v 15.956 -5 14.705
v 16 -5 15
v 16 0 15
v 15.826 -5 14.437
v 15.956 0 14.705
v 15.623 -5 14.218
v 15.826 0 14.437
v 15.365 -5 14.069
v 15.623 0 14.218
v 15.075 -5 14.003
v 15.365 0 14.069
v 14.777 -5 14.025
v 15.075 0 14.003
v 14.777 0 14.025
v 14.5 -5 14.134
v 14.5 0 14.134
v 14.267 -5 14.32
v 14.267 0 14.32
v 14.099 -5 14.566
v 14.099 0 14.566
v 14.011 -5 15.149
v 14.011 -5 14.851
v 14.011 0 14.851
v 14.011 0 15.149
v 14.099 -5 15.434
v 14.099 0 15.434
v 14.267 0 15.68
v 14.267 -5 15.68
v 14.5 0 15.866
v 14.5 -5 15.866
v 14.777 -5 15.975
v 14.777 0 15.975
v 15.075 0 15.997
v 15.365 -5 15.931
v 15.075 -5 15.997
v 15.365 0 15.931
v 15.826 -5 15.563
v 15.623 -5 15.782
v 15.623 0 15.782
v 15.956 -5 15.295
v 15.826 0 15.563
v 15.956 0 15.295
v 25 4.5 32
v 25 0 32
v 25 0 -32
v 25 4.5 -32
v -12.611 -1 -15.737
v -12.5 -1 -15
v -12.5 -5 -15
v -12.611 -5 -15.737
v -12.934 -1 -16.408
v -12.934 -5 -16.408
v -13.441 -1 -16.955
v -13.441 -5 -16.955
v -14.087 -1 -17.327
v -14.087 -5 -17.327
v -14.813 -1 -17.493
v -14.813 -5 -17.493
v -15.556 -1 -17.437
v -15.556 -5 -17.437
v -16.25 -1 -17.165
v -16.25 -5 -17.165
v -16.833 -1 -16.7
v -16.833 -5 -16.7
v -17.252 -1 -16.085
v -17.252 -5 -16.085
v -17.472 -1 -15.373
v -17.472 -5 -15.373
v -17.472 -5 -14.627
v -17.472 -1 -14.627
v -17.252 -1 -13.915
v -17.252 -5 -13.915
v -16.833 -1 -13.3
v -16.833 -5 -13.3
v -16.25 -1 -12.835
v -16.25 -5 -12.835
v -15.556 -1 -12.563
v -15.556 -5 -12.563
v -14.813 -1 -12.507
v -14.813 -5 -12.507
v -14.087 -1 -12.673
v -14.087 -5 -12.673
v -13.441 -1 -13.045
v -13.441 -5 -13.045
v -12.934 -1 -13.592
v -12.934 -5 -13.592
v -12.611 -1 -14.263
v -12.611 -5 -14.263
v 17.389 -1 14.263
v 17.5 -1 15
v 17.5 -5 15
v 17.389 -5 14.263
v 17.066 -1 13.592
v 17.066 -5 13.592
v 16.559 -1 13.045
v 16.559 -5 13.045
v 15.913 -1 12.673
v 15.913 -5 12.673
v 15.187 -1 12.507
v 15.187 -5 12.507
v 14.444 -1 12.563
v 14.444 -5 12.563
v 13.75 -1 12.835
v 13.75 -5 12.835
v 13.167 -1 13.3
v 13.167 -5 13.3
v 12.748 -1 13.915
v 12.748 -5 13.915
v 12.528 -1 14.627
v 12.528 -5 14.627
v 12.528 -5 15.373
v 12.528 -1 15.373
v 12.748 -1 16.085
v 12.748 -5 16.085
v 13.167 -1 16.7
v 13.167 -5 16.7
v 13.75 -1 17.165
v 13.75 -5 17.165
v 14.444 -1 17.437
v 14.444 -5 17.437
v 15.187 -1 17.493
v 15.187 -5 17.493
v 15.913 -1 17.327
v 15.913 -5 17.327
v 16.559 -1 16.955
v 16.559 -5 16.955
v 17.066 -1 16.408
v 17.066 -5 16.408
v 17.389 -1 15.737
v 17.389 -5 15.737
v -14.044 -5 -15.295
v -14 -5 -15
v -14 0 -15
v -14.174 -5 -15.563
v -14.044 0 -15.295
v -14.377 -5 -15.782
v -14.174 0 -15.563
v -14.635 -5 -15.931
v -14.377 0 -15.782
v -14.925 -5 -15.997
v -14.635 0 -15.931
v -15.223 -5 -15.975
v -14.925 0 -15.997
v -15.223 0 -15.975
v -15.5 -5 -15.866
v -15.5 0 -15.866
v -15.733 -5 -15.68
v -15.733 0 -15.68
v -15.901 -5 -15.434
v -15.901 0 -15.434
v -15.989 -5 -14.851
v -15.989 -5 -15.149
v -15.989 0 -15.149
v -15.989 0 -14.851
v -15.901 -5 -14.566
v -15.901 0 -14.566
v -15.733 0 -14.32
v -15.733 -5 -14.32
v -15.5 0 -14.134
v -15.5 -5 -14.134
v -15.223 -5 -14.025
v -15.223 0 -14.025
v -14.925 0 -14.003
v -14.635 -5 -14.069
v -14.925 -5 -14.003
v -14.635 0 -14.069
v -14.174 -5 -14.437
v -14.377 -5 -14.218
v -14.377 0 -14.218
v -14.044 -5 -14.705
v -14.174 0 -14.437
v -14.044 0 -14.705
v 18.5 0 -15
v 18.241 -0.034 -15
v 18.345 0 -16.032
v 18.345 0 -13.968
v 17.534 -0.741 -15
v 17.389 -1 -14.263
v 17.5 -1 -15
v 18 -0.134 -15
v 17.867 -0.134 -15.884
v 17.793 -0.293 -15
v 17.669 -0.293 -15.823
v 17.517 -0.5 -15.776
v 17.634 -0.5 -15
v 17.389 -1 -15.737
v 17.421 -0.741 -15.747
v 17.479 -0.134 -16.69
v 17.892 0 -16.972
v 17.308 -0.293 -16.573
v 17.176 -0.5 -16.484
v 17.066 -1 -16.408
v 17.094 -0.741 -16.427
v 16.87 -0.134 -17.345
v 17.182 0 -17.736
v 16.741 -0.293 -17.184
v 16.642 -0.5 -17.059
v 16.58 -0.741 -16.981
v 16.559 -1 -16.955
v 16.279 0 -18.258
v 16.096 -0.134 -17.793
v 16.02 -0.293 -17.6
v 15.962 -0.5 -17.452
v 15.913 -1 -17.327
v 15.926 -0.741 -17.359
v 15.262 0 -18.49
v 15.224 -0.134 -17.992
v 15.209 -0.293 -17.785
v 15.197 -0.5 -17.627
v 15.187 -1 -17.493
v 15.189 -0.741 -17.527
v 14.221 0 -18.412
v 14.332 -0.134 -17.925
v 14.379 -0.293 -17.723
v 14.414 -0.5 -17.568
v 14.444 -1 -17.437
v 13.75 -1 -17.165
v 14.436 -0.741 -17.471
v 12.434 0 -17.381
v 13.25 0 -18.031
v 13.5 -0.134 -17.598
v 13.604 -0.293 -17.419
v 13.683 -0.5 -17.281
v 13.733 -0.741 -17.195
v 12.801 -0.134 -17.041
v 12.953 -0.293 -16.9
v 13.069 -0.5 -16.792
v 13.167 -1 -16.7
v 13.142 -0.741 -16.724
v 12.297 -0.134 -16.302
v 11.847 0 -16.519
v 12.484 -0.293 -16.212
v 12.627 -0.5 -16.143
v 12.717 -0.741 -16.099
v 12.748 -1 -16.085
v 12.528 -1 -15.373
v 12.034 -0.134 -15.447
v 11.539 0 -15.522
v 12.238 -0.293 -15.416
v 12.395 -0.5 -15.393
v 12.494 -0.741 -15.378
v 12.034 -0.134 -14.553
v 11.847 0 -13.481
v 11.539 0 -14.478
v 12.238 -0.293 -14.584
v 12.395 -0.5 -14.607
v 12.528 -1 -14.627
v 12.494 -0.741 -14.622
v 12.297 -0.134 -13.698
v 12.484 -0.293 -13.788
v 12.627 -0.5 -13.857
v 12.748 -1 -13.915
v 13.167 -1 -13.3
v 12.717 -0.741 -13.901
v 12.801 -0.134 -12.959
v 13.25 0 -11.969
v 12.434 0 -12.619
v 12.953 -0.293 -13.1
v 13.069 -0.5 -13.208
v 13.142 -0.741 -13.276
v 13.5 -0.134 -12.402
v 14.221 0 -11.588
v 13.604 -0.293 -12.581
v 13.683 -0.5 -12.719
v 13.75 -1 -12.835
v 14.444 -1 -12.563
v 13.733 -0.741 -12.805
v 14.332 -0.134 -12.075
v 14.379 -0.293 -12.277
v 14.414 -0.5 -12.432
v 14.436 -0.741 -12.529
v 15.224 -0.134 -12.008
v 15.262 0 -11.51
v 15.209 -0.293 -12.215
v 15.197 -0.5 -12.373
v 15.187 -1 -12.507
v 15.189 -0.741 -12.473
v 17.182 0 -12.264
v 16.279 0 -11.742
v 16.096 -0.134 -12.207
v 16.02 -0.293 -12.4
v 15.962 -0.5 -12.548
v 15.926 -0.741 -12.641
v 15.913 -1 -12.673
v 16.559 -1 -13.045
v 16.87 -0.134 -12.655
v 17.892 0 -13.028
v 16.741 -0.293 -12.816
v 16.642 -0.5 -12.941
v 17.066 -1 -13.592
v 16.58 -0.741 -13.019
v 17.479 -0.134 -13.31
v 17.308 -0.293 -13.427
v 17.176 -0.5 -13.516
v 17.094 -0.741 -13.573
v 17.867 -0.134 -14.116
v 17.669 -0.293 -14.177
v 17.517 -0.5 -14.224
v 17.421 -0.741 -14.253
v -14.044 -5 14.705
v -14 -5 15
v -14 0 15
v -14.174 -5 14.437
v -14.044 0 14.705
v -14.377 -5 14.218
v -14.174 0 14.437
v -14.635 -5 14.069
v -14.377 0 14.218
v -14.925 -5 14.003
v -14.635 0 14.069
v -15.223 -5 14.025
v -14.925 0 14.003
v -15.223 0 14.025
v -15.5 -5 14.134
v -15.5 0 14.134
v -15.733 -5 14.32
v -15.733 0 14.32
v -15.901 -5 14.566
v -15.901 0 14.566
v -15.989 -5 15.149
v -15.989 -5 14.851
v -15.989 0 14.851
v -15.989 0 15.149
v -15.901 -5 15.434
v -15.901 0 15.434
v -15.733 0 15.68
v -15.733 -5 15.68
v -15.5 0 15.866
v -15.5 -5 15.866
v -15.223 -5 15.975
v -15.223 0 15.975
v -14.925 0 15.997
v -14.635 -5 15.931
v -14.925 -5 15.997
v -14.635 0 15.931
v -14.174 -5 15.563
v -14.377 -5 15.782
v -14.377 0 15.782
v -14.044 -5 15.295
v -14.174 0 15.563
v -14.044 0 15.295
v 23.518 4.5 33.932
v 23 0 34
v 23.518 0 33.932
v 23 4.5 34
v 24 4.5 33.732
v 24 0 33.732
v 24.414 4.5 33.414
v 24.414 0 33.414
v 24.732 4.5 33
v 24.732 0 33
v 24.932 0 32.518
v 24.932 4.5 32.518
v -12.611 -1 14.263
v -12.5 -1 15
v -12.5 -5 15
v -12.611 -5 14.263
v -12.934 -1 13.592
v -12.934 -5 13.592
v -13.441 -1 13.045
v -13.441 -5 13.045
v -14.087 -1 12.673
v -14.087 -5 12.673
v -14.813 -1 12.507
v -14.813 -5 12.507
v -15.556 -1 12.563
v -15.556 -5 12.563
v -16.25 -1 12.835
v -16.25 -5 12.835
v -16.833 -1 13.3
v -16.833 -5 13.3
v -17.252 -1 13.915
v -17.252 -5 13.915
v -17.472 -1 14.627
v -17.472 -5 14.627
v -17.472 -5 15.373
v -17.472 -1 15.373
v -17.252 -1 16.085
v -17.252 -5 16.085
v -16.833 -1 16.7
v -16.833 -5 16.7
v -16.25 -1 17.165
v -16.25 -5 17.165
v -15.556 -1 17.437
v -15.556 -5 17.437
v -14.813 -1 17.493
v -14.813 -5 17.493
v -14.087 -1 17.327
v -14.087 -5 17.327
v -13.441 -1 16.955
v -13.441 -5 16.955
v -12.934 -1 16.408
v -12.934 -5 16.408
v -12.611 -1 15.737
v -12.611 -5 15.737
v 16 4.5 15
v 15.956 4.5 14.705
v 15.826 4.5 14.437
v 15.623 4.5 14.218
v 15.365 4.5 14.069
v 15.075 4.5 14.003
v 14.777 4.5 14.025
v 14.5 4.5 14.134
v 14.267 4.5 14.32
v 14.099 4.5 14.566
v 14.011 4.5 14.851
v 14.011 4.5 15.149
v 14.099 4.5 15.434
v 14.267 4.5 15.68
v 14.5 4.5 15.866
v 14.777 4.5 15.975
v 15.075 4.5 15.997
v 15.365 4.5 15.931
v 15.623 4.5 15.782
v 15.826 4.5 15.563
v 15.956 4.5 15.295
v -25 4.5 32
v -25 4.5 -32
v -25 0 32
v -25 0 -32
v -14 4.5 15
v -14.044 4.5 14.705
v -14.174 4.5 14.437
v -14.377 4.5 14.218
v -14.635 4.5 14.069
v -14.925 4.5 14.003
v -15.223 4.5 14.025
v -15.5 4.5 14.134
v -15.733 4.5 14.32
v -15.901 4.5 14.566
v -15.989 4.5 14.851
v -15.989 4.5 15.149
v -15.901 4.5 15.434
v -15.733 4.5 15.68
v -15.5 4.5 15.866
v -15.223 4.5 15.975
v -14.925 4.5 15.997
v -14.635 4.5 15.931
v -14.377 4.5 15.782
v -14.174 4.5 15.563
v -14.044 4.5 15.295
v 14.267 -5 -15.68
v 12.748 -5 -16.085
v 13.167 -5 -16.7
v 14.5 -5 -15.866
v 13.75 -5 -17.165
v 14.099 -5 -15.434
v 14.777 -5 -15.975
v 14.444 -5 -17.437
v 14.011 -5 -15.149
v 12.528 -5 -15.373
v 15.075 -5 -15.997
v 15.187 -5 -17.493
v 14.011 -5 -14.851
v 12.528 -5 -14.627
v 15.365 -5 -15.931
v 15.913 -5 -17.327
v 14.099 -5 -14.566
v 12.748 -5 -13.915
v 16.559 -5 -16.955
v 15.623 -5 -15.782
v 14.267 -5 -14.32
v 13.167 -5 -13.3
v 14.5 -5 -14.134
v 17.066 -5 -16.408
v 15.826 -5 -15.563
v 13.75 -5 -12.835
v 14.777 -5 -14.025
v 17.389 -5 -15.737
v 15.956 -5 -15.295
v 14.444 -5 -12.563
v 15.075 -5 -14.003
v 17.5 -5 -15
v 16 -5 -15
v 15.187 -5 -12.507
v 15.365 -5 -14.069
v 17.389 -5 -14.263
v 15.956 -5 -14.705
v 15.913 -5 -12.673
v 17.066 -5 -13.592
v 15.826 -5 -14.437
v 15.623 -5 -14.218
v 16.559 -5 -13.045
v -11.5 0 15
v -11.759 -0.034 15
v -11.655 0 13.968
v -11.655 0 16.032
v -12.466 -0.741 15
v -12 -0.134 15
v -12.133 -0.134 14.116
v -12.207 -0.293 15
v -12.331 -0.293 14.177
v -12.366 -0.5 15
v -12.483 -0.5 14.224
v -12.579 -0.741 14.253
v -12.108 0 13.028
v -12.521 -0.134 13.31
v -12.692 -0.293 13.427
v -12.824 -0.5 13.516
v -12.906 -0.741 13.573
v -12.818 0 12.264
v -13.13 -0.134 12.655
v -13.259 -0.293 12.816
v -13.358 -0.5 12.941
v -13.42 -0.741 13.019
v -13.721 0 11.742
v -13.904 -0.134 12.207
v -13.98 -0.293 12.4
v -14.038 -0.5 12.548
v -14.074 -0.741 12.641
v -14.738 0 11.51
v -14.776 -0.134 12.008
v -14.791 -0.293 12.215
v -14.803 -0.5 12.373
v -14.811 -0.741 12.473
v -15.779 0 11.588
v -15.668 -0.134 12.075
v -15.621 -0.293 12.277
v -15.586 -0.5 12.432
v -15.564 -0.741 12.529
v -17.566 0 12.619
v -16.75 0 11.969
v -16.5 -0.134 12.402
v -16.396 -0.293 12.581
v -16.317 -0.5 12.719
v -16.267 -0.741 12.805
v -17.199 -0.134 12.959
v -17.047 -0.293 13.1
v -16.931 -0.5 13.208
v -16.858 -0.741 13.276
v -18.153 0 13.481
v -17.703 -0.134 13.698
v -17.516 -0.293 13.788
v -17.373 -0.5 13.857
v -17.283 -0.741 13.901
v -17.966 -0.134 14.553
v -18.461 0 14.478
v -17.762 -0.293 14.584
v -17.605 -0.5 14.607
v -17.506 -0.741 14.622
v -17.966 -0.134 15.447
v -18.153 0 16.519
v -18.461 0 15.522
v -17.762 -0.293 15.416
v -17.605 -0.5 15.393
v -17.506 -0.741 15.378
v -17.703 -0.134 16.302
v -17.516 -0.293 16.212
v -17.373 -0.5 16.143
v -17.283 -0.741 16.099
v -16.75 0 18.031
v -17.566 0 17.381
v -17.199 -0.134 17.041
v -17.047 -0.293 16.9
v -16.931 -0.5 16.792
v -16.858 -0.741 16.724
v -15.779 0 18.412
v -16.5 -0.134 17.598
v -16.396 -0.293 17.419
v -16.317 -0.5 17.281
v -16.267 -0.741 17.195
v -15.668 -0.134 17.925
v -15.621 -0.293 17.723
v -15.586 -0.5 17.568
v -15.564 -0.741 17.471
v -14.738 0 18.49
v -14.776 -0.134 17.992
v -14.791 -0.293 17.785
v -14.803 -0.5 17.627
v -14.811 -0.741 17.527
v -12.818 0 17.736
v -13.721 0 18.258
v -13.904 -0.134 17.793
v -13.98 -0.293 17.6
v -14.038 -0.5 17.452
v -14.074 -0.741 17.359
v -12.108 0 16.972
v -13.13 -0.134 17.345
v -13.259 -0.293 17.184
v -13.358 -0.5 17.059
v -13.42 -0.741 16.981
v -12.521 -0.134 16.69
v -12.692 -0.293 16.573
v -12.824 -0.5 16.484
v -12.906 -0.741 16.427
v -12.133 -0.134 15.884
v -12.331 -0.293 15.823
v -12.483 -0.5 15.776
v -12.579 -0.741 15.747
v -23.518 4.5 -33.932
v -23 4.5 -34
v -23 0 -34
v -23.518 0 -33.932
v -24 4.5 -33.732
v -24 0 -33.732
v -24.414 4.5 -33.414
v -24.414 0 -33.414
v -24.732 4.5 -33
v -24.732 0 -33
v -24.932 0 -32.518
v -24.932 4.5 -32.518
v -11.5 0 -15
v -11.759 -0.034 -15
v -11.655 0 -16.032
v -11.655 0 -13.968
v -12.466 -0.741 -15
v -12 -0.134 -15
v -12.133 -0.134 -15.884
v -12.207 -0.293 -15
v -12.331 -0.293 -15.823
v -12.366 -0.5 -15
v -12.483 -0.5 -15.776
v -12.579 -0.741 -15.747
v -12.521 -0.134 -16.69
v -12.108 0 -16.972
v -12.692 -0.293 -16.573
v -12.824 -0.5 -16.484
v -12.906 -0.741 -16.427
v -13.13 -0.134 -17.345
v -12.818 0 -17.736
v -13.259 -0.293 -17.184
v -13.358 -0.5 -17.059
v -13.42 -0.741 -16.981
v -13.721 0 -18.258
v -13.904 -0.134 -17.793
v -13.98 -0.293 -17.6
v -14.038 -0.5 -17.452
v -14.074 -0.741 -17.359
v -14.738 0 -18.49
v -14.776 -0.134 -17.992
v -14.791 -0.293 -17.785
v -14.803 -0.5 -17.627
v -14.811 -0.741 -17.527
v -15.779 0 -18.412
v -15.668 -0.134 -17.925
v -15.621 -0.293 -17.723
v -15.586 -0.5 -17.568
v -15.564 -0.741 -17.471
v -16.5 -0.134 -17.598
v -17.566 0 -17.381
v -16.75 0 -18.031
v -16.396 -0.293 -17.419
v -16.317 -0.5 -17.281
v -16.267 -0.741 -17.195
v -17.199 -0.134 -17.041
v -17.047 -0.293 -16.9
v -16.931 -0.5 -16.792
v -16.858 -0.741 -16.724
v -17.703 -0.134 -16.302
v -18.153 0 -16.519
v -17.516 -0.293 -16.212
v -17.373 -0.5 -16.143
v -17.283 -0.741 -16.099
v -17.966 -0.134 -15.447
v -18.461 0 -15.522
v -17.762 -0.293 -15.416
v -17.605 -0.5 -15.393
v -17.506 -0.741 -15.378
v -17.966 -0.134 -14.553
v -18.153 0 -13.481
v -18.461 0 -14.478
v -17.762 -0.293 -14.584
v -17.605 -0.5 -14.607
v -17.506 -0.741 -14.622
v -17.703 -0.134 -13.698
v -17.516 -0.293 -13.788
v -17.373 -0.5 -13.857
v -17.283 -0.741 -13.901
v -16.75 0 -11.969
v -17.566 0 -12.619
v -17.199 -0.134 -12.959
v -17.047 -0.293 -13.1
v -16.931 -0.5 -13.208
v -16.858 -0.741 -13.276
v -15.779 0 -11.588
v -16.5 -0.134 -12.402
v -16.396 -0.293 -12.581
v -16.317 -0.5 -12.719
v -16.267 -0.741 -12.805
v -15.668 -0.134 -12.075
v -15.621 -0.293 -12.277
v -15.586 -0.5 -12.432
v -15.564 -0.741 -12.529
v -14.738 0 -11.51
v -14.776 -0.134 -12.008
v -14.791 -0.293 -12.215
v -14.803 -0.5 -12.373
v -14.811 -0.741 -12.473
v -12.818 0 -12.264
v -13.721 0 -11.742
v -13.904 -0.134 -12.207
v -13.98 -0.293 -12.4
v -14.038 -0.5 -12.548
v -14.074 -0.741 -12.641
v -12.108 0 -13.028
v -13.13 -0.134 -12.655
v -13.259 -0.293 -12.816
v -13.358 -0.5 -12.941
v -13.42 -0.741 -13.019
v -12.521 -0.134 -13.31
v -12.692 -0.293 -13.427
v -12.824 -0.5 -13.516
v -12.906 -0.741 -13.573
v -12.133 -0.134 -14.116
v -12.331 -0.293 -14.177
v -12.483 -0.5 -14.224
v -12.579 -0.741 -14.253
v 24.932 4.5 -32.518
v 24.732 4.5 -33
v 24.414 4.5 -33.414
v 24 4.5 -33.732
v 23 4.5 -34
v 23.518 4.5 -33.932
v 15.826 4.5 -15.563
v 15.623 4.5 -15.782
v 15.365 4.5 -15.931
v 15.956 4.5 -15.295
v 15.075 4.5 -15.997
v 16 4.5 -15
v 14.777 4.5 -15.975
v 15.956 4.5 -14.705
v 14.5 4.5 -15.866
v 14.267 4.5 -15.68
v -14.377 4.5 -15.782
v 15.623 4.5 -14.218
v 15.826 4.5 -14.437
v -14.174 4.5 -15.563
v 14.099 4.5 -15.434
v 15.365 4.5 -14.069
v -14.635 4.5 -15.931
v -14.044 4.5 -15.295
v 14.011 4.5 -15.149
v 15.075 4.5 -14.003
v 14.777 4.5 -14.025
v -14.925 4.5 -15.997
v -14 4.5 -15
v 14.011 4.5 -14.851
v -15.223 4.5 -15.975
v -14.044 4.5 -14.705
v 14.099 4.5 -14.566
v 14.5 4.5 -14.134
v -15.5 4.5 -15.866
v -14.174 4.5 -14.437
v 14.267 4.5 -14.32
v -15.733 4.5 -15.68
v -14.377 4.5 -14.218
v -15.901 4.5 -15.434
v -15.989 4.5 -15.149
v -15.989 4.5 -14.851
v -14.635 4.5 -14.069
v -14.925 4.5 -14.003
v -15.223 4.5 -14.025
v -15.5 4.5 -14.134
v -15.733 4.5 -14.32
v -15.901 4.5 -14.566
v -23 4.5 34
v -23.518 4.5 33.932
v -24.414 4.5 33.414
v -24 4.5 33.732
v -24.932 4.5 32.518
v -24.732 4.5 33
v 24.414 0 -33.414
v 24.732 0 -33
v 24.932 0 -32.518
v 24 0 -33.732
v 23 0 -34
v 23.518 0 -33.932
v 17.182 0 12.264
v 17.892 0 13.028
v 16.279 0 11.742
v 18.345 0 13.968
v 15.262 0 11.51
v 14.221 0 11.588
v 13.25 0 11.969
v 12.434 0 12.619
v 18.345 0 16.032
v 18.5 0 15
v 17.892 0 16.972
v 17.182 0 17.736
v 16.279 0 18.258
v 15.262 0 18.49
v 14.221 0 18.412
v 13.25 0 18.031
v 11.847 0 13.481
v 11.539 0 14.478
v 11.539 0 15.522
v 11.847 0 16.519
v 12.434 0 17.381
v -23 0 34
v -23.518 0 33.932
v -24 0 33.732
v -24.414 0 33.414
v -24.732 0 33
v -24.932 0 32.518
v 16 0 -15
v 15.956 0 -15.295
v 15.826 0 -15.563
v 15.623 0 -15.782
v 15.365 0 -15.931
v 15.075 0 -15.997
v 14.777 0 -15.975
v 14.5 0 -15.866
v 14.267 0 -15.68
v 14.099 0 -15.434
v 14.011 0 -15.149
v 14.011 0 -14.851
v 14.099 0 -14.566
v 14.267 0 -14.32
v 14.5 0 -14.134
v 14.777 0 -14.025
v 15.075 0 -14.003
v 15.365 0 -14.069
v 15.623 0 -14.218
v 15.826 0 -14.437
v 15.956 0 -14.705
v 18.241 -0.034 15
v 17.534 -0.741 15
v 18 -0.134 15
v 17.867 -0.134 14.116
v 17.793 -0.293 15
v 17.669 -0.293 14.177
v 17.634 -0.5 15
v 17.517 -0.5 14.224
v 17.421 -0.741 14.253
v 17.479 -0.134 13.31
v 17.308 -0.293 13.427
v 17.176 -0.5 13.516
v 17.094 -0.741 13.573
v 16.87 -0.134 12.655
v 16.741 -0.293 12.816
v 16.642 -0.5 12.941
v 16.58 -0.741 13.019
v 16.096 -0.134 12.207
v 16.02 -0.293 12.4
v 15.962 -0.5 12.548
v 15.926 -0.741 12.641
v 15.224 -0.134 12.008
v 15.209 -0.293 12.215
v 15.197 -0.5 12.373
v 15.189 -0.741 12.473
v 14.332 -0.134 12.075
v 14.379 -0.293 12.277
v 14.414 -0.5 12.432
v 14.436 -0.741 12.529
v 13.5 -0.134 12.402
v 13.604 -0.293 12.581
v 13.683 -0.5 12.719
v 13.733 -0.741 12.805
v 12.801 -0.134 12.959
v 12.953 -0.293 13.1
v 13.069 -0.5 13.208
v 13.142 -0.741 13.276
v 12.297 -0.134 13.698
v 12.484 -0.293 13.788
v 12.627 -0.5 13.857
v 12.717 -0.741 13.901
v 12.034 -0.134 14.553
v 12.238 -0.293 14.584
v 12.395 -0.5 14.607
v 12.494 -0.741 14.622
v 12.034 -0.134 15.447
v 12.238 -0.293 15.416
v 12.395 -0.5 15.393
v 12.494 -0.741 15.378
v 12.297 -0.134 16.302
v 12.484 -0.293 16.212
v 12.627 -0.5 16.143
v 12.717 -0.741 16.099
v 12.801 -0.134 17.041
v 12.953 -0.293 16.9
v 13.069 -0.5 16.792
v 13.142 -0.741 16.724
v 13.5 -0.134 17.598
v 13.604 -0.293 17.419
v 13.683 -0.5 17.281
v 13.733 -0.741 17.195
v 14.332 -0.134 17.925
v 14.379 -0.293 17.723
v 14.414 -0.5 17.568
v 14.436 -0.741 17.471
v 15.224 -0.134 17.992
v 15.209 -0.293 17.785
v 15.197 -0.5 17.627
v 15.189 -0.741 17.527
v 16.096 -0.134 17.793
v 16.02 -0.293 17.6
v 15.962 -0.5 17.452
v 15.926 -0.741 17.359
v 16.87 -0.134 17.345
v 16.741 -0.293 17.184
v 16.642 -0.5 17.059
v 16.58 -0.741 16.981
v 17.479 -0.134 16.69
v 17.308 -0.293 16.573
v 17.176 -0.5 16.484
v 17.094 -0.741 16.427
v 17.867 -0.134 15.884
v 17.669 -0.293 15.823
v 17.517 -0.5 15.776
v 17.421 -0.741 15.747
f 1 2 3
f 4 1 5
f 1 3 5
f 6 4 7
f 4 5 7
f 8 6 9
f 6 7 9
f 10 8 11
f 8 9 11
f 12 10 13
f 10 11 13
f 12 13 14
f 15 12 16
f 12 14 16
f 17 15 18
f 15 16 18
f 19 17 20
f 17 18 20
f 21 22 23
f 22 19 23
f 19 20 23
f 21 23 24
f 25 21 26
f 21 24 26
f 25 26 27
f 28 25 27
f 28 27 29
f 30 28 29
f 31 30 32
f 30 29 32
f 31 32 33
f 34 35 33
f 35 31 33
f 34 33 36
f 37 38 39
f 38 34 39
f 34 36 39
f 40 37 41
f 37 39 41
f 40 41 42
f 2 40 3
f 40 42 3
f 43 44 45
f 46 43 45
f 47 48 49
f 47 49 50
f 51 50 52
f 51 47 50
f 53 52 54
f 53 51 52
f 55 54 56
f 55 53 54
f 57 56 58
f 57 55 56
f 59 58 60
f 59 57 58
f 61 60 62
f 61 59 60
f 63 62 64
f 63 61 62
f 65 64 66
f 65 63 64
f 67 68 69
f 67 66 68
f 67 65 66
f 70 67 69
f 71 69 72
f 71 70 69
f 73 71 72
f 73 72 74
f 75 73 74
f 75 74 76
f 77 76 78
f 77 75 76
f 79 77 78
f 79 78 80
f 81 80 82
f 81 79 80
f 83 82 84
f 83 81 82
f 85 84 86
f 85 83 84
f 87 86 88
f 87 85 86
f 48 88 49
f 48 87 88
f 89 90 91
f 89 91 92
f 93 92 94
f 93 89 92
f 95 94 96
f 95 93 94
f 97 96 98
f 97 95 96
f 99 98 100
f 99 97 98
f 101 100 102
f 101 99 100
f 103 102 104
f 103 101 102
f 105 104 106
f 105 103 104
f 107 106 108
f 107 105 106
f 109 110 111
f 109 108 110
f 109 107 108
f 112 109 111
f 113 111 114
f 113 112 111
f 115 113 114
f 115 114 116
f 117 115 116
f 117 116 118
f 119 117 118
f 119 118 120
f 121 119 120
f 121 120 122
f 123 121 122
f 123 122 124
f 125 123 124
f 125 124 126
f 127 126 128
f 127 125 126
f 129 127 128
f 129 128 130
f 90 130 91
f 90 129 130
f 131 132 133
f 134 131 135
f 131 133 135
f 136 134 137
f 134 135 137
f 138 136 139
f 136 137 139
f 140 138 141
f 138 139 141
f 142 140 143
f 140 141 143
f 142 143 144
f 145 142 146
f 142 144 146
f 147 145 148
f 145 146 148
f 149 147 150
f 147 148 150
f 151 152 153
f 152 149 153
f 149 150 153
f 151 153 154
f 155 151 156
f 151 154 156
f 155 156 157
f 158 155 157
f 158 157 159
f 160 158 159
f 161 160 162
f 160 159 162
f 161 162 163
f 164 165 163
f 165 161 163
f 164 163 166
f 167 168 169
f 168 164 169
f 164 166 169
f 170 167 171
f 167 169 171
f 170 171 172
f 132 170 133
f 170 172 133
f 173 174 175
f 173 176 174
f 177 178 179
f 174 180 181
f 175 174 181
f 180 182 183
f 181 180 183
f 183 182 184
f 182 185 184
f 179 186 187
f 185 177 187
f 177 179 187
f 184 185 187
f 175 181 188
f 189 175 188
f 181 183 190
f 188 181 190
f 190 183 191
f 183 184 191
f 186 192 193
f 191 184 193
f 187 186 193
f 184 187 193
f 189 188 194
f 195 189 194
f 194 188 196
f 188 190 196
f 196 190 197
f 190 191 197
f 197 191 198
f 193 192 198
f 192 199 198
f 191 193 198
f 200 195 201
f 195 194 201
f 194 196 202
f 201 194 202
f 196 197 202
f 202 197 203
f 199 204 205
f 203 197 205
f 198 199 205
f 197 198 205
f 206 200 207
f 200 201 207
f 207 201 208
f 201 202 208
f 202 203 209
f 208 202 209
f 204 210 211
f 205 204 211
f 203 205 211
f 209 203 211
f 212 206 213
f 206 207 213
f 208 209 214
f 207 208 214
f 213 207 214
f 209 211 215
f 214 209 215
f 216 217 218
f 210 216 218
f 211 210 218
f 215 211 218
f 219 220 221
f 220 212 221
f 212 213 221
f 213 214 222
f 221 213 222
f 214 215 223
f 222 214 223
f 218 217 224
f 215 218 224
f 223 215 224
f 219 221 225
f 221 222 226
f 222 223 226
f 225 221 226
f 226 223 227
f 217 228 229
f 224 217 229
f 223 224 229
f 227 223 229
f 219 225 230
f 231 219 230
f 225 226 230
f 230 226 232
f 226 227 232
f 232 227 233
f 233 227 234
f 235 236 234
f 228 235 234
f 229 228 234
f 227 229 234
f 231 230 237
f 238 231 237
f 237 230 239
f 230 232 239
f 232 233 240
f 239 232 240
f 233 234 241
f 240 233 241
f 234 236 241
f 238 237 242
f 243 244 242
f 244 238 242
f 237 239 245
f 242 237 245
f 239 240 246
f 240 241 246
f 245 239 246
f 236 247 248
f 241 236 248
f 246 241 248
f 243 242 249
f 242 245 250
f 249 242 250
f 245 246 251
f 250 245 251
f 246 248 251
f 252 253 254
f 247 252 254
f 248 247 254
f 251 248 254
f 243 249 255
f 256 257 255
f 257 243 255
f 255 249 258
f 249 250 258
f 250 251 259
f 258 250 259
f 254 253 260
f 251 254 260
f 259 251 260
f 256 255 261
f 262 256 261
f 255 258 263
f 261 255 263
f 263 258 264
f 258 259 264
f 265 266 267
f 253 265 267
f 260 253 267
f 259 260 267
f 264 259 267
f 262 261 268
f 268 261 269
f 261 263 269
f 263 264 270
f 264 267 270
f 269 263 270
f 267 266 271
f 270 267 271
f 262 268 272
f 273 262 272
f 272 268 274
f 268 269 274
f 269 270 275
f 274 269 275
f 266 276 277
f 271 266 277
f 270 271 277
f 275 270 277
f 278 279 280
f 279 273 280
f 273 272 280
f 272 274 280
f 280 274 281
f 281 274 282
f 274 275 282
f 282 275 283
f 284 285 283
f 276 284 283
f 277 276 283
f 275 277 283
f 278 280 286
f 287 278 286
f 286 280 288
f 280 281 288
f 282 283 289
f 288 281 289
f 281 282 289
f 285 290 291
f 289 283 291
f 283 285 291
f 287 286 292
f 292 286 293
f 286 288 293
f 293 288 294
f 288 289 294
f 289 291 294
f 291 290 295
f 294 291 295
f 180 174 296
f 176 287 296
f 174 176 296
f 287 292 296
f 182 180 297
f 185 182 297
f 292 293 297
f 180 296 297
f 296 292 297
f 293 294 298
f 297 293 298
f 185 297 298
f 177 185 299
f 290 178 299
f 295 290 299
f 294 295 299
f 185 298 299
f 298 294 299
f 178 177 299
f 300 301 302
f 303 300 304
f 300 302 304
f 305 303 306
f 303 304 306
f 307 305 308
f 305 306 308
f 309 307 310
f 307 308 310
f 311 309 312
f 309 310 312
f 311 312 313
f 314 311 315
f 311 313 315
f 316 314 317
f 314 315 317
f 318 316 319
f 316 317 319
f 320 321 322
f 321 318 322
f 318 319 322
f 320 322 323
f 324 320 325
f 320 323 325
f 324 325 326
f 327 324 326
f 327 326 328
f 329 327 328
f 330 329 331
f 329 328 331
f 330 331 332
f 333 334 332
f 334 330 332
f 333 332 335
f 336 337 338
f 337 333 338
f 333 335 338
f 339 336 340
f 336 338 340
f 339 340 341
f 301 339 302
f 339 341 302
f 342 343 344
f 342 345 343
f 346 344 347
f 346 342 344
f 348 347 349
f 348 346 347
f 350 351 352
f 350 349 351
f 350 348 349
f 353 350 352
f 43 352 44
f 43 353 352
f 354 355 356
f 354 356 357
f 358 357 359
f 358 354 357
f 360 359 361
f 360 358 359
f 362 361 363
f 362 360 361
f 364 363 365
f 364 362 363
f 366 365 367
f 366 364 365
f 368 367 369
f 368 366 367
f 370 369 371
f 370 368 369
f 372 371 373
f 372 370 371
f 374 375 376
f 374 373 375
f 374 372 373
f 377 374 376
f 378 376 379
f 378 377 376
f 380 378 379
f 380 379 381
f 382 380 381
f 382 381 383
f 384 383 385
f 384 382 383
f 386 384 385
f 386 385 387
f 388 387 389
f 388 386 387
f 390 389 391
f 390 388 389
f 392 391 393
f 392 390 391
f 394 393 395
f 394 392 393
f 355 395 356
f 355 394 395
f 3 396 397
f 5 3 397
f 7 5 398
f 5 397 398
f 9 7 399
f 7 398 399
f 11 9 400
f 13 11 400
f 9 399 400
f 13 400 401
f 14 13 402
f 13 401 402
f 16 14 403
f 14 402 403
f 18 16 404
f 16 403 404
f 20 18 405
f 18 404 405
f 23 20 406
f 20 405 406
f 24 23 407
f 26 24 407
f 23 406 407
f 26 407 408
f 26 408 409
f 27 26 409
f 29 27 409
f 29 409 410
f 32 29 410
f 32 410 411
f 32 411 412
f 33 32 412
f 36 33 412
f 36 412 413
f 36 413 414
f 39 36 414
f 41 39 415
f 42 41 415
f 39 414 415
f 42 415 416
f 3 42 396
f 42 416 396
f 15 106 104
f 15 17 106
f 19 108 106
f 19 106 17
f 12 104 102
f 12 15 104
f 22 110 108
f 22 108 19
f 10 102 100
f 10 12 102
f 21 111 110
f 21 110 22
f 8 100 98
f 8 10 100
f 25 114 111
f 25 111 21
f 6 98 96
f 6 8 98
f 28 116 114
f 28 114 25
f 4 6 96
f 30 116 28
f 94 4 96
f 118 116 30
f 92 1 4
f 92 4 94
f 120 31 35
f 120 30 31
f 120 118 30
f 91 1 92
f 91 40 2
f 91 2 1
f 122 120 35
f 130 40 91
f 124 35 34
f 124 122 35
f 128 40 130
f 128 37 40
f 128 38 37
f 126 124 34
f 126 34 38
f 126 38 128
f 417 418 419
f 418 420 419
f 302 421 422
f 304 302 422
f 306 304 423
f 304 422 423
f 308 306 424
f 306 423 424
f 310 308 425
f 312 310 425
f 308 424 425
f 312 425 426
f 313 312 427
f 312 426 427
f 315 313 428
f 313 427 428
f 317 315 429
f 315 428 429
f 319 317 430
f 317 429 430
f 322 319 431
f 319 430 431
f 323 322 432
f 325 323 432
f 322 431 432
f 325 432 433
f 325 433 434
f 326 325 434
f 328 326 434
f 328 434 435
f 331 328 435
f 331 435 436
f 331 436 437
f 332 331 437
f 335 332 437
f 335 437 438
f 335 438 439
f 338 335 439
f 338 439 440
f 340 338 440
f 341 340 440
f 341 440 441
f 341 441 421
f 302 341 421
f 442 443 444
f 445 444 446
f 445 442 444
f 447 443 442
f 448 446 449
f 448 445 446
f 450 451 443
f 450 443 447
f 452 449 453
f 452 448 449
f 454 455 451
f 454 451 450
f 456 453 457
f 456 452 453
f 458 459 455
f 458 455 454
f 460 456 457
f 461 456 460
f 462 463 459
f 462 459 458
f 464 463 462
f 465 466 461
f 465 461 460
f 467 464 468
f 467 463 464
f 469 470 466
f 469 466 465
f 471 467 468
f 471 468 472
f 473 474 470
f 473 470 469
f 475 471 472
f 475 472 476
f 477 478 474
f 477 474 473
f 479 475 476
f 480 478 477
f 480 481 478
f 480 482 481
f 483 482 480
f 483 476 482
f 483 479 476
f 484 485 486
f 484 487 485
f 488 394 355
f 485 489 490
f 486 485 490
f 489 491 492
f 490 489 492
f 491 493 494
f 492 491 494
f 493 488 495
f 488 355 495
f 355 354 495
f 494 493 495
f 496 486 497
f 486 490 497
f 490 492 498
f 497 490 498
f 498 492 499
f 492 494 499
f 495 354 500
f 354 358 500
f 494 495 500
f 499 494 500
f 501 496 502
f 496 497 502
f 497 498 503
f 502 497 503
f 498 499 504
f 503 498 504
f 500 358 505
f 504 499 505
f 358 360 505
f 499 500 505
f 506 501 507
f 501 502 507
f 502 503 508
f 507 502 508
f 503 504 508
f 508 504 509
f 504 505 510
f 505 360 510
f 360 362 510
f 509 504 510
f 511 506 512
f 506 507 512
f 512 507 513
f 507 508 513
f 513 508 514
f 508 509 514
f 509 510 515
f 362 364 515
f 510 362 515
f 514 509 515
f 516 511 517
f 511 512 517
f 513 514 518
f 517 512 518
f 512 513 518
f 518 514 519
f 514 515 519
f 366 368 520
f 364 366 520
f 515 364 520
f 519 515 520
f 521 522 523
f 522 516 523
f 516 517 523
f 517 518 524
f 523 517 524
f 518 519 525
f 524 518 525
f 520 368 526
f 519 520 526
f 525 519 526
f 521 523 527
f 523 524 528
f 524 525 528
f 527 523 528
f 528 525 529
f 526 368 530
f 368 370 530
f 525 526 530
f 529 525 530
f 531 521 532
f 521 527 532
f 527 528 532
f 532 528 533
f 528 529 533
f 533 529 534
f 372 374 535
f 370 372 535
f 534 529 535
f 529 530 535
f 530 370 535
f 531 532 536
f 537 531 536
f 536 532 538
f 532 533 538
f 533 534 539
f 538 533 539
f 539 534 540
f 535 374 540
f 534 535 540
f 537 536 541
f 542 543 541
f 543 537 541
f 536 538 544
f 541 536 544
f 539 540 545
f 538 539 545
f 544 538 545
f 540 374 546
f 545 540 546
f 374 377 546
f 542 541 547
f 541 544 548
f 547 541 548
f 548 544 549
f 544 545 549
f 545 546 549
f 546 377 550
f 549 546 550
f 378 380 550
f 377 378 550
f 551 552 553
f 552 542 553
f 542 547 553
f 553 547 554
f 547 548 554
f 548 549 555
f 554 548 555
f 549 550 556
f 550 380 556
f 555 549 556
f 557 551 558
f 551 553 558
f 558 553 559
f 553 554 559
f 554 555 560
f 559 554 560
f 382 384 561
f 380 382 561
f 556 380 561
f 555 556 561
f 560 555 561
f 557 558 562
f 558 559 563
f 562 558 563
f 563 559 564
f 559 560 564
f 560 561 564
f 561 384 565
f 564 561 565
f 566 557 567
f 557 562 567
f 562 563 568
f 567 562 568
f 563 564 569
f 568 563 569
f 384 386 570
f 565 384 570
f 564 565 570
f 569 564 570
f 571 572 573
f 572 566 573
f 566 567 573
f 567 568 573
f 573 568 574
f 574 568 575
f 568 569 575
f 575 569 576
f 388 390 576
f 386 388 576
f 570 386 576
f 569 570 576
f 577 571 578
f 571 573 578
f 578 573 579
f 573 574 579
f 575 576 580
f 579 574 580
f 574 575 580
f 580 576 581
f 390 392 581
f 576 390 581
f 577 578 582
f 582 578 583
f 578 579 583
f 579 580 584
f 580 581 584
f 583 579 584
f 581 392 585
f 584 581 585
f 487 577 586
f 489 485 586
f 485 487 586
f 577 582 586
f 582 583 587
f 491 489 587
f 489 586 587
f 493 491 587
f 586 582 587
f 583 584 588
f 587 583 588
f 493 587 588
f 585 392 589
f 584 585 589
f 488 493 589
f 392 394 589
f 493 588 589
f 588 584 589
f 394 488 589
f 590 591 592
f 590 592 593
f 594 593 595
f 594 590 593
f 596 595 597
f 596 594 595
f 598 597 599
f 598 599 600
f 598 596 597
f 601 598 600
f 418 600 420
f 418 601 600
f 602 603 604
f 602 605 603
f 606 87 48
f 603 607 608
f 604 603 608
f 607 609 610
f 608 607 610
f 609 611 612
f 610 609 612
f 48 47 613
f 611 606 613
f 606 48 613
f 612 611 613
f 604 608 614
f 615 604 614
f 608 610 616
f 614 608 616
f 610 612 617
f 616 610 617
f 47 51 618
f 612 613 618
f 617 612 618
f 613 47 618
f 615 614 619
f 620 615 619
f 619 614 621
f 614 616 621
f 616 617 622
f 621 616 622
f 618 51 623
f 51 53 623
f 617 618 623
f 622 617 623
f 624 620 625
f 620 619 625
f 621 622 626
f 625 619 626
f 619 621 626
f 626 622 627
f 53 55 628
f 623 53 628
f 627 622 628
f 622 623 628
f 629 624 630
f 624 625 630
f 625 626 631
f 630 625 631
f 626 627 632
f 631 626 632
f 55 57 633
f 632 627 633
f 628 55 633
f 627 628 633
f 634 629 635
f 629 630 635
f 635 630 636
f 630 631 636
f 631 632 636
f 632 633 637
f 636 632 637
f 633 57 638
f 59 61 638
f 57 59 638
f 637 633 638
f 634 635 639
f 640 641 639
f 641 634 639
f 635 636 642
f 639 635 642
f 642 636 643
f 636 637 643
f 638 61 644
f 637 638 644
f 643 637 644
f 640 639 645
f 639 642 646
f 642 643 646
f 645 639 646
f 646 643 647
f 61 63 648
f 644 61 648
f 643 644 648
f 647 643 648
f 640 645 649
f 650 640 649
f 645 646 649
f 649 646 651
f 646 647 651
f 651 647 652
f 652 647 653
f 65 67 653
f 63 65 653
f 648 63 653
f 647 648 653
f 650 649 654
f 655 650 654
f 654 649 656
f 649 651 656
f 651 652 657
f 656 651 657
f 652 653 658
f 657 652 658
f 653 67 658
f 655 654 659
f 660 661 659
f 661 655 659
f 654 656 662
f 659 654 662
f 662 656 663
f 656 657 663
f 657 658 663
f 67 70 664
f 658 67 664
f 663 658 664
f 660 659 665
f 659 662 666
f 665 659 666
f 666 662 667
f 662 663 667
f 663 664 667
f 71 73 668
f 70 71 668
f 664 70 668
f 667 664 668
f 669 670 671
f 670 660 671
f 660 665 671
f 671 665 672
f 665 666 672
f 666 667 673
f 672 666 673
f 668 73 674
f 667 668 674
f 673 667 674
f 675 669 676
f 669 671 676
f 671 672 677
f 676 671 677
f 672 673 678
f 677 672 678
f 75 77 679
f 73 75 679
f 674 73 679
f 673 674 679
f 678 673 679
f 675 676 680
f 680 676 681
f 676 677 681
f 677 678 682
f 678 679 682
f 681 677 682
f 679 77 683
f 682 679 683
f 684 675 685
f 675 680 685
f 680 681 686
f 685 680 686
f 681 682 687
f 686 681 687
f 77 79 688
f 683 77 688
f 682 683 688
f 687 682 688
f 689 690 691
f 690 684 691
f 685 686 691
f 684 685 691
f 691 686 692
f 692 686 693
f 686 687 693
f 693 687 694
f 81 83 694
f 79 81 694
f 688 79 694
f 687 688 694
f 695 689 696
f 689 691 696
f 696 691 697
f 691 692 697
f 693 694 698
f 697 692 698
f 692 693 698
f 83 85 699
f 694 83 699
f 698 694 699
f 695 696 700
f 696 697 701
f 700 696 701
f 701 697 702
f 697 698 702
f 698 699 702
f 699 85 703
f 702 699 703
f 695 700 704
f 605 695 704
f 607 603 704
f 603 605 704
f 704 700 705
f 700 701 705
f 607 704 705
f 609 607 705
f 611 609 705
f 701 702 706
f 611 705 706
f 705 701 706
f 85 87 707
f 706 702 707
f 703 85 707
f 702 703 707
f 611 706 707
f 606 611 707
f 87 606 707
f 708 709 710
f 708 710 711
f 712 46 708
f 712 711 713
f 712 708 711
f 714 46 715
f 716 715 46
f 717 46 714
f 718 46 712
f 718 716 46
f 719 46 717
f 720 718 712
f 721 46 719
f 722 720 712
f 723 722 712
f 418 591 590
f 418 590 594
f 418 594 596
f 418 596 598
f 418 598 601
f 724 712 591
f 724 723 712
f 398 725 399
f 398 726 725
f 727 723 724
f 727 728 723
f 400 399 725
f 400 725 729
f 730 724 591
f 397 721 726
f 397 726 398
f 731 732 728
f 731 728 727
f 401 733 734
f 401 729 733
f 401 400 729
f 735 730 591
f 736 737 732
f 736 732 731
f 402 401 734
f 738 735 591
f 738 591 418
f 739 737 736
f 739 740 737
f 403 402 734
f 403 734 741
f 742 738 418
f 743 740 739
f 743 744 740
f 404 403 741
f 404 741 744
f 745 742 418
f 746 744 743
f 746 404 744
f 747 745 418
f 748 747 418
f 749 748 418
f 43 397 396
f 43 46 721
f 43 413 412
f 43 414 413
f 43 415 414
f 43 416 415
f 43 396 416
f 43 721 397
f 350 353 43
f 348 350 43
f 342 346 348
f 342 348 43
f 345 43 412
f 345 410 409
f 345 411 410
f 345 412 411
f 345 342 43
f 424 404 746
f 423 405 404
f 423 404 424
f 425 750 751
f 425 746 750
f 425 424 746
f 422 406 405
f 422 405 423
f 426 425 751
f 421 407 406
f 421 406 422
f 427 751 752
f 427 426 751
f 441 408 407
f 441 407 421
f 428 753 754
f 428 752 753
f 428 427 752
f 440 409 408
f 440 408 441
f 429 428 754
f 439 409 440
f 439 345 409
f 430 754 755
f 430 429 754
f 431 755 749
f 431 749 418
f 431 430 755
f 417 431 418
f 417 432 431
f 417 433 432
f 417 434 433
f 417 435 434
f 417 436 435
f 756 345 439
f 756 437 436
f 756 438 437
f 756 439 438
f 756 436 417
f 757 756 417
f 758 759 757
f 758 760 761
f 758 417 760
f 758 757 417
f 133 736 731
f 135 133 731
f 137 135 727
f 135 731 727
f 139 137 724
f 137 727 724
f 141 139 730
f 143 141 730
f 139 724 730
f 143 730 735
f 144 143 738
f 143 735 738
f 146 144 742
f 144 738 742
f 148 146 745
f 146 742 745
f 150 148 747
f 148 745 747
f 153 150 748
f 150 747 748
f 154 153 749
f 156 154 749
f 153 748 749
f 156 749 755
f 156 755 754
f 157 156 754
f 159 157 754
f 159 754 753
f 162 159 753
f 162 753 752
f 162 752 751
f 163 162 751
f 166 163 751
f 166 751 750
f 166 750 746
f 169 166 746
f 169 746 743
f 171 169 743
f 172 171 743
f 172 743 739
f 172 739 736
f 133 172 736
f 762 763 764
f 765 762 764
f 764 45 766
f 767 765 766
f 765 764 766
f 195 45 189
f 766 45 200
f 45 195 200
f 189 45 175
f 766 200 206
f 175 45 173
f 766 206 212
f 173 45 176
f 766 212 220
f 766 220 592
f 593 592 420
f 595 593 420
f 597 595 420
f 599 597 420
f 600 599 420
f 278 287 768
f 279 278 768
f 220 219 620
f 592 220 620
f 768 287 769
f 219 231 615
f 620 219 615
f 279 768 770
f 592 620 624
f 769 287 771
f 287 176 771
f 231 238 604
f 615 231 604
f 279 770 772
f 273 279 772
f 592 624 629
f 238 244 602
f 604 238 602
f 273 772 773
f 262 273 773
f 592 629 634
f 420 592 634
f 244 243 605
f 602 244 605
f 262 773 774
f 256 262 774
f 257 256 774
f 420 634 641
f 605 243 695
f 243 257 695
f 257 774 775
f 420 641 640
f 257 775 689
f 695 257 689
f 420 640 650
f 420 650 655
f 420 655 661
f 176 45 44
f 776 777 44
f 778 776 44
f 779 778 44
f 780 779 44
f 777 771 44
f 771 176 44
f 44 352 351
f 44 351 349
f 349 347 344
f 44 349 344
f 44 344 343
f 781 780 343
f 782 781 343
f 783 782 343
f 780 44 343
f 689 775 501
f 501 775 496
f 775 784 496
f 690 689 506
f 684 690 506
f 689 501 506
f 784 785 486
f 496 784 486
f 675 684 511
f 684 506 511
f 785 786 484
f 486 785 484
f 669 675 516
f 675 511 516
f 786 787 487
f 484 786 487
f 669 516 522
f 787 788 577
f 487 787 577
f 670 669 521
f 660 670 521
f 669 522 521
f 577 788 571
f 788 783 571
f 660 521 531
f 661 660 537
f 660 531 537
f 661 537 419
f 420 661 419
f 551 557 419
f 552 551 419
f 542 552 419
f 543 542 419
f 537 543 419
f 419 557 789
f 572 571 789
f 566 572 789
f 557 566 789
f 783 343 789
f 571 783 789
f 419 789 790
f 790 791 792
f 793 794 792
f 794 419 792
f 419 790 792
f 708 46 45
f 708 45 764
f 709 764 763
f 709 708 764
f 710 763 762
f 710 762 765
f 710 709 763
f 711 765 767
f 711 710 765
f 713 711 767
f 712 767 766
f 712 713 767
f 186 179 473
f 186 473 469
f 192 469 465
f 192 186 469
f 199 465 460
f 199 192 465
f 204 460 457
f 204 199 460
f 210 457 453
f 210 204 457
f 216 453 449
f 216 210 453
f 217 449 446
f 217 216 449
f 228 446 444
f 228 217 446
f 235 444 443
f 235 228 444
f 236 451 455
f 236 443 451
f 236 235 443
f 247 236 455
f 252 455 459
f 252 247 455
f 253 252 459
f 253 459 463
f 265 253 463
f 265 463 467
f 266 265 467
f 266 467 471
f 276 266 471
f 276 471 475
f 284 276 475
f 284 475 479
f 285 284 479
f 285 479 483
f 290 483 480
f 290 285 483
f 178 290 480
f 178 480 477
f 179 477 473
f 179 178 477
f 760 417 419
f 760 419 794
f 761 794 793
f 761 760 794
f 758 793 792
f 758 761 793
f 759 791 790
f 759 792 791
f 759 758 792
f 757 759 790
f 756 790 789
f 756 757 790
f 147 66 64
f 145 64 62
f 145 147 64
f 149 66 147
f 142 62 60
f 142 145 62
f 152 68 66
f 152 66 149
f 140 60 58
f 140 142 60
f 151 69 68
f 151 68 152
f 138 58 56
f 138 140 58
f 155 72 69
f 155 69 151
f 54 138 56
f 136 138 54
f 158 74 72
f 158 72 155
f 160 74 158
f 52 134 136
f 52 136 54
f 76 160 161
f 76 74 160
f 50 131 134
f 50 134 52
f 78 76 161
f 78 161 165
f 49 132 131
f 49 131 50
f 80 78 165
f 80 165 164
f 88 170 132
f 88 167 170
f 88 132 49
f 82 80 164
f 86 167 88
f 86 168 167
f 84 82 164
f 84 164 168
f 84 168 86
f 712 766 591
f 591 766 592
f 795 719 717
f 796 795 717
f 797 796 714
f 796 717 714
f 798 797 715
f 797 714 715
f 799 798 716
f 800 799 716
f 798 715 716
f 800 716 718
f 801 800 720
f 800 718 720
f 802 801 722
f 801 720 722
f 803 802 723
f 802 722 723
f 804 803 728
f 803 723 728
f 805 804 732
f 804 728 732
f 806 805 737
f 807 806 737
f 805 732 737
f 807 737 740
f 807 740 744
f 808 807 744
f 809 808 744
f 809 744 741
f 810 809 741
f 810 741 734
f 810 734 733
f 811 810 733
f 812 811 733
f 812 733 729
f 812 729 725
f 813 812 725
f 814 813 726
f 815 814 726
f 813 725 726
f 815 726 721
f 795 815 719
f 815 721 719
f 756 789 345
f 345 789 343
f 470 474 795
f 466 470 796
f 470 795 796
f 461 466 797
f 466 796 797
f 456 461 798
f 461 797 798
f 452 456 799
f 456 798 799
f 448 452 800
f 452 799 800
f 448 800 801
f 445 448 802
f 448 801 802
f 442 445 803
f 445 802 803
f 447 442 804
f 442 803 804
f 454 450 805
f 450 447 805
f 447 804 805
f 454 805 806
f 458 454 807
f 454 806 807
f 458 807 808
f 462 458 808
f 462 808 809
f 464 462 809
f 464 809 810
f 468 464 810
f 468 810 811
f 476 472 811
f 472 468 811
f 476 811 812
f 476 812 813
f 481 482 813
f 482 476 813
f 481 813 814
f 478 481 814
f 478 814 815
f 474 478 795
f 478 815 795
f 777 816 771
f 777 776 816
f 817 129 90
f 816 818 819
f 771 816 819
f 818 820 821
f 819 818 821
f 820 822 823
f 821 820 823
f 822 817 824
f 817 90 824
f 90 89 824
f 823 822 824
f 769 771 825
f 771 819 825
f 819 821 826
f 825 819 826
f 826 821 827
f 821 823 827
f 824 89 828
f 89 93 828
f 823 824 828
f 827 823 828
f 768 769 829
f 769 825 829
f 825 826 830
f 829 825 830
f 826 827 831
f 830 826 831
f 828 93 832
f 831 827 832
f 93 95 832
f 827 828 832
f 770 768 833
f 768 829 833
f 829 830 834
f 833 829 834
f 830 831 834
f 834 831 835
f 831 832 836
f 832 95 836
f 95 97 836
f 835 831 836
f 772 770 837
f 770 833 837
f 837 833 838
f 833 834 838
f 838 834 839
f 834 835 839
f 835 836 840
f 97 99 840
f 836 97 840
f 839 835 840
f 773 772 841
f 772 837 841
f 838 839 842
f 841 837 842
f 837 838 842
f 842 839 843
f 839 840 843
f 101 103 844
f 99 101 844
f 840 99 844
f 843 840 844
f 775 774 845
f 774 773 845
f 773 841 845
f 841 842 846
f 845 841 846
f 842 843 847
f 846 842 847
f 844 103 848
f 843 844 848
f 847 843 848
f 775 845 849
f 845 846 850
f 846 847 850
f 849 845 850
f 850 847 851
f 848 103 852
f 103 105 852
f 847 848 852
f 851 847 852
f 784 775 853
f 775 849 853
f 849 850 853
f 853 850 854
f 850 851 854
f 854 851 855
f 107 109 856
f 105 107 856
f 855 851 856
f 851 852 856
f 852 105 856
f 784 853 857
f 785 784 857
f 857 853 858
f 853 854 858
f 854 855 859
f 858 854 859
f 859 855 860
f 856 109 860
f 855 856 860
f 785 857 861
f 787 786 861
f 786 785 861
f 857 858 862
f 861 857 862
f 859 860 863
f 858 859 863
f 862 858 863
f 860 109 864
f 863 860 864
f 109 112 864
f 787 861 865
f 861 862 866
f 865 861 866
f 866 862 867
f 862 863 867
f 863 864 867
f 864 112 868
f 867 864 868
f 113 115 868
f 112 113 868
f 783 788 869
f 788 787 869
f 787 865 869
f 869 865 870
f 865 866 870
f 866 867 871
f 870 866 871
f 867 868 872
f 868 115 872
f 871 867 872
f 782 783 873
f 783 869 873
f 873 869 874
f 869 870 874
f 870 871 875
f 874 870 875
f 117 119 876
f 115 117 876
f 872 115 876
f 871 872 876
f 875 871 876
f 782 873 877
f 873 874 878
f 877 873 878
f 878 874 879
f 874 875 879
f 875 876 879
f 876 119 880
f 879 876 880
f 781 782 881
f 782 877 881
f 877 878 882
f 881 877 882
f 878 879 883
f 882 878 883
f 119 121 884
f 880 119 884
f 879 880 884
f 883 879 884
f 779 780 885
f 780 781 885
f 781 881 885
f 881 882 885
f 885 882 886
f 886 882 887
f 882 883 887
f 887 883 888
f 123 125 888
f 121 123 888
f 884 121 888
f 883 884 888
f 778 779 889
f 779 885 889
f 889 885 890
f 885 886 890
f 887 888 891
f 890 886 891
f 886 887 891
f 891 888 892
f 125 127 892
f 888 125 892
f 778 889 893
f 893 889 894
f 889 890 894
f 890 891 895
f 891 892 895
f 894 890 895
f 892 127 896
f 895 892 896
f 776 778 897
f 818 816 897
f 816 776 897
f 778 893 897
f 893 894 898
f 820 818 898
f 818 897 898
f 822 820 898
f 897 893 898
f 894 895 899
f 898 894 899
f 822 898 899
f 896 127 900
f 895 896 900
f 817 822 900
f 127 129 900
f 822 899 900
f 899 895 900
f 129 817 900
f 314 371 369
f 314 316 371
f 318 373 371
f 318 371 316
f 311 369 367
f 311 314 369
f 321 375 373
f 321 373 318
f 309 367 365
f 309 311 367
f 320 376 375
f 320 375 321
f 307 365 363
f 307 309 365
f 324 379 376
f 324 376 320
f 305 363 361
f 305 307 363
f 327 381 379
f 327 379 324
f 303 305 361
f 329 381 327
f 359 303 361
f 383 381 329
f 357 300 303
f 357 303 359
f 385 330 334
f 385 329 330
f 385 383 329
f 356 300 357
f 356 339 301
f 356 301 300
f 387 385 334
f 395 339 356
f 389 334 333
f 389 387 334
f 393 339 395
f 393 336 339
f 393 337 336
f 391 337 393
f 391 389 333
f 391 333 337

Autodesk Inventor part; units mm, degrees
ref_plane "YZ Plane" through (0, 0, 0) normal (1, 0, 0) x (0, 1, 0)
ref_plane "XZ Plane" through (0, 0, 0) normal (0, 1, 0) x (-1, 0, 0)
ref_plane "XY Plane" through (0, 0, 0) normal (0, 0, 1) x (1, 0, 0)
sketch "Sketch1" plane through (0, 0, 0) normal (0, 1, 0) x (-1, 0, 0)
  line L0 (-25, -34) -> (25, -34)
  line L1 (25, -34) -> (25, 34)
  line L2 (25, 34) -> (-25, 34)
  line L3 (-25, 34) -> (-25, -34)
  line L4 (-25, -34) -> (25, 34) construction
  line L5 (25, -34) -> (-25, 34) construction
  point P0 (0, 0)
  dimension "d0" = 50
  dimension "d1" = 68
extrude "Extrusion1" add sketch "Sketch1" along normal blind 4.5
sketch "Sketch2" plane through (0, 4.5, 0) normal (0, 1, 0) x (1, 0, 0)
  circle A0 centre (-15, 15) radius 1
  circle A1 centre (15, 15) radius 1
  circle A2 centre (15, -15) radius 1
  circle A3 centre (-15, -15) radius 1
  point P0 (0, 0)
  dimension "d4" = 2
  dimension "d5" = 2
  dimension "d6" = 2
  dimension "d7" = 2
extrude "Extrusion2" cut sketch "Sketch2" against normal blind 4.5
sketch "Sketch3" plane through (0, 0, 0) normal (0, -1, 0) x (1, 0, 0)
  circle A0 centre (15, 15) radius 2.5
  circle A1 centre (-15, 15) radius 2.5
  circle A2 centre (-15, -15) radius 2.5
  circle A3 centre (15, -15) radius 2.5
  circle A4 centre (15, -15) radius 1
  circle A5 centre (15, 15) radius 1 projected
  circle A6 centre (15, 15) radius 1
  circle A7 centre (-15, 15) radius 1 projected
  circle A8 centre (-15, 15) radius 1
  circle A9 centre (-15, -15) radius 1
  point P0 (0, 0)
  dimension "d10" = 5
  dimension "d11" = 5
  dimension "d12" = 5
extrude "Extrusion3" add sketch "Sketch3" along normal blind 5
fillet "Fillet1" radius 2 4 edges at (-25, 2.25, 34) (25, 2.25, 34) (25, 2.25, -34) (-25, 2.25, -34)
fillet "Fillet2" radius 1 4 edges at (12.5, 0, -15) (12.5, 0, 15) (-17.5, 0, -15) (-17.5, 0, 15)
properties part number "feste"
